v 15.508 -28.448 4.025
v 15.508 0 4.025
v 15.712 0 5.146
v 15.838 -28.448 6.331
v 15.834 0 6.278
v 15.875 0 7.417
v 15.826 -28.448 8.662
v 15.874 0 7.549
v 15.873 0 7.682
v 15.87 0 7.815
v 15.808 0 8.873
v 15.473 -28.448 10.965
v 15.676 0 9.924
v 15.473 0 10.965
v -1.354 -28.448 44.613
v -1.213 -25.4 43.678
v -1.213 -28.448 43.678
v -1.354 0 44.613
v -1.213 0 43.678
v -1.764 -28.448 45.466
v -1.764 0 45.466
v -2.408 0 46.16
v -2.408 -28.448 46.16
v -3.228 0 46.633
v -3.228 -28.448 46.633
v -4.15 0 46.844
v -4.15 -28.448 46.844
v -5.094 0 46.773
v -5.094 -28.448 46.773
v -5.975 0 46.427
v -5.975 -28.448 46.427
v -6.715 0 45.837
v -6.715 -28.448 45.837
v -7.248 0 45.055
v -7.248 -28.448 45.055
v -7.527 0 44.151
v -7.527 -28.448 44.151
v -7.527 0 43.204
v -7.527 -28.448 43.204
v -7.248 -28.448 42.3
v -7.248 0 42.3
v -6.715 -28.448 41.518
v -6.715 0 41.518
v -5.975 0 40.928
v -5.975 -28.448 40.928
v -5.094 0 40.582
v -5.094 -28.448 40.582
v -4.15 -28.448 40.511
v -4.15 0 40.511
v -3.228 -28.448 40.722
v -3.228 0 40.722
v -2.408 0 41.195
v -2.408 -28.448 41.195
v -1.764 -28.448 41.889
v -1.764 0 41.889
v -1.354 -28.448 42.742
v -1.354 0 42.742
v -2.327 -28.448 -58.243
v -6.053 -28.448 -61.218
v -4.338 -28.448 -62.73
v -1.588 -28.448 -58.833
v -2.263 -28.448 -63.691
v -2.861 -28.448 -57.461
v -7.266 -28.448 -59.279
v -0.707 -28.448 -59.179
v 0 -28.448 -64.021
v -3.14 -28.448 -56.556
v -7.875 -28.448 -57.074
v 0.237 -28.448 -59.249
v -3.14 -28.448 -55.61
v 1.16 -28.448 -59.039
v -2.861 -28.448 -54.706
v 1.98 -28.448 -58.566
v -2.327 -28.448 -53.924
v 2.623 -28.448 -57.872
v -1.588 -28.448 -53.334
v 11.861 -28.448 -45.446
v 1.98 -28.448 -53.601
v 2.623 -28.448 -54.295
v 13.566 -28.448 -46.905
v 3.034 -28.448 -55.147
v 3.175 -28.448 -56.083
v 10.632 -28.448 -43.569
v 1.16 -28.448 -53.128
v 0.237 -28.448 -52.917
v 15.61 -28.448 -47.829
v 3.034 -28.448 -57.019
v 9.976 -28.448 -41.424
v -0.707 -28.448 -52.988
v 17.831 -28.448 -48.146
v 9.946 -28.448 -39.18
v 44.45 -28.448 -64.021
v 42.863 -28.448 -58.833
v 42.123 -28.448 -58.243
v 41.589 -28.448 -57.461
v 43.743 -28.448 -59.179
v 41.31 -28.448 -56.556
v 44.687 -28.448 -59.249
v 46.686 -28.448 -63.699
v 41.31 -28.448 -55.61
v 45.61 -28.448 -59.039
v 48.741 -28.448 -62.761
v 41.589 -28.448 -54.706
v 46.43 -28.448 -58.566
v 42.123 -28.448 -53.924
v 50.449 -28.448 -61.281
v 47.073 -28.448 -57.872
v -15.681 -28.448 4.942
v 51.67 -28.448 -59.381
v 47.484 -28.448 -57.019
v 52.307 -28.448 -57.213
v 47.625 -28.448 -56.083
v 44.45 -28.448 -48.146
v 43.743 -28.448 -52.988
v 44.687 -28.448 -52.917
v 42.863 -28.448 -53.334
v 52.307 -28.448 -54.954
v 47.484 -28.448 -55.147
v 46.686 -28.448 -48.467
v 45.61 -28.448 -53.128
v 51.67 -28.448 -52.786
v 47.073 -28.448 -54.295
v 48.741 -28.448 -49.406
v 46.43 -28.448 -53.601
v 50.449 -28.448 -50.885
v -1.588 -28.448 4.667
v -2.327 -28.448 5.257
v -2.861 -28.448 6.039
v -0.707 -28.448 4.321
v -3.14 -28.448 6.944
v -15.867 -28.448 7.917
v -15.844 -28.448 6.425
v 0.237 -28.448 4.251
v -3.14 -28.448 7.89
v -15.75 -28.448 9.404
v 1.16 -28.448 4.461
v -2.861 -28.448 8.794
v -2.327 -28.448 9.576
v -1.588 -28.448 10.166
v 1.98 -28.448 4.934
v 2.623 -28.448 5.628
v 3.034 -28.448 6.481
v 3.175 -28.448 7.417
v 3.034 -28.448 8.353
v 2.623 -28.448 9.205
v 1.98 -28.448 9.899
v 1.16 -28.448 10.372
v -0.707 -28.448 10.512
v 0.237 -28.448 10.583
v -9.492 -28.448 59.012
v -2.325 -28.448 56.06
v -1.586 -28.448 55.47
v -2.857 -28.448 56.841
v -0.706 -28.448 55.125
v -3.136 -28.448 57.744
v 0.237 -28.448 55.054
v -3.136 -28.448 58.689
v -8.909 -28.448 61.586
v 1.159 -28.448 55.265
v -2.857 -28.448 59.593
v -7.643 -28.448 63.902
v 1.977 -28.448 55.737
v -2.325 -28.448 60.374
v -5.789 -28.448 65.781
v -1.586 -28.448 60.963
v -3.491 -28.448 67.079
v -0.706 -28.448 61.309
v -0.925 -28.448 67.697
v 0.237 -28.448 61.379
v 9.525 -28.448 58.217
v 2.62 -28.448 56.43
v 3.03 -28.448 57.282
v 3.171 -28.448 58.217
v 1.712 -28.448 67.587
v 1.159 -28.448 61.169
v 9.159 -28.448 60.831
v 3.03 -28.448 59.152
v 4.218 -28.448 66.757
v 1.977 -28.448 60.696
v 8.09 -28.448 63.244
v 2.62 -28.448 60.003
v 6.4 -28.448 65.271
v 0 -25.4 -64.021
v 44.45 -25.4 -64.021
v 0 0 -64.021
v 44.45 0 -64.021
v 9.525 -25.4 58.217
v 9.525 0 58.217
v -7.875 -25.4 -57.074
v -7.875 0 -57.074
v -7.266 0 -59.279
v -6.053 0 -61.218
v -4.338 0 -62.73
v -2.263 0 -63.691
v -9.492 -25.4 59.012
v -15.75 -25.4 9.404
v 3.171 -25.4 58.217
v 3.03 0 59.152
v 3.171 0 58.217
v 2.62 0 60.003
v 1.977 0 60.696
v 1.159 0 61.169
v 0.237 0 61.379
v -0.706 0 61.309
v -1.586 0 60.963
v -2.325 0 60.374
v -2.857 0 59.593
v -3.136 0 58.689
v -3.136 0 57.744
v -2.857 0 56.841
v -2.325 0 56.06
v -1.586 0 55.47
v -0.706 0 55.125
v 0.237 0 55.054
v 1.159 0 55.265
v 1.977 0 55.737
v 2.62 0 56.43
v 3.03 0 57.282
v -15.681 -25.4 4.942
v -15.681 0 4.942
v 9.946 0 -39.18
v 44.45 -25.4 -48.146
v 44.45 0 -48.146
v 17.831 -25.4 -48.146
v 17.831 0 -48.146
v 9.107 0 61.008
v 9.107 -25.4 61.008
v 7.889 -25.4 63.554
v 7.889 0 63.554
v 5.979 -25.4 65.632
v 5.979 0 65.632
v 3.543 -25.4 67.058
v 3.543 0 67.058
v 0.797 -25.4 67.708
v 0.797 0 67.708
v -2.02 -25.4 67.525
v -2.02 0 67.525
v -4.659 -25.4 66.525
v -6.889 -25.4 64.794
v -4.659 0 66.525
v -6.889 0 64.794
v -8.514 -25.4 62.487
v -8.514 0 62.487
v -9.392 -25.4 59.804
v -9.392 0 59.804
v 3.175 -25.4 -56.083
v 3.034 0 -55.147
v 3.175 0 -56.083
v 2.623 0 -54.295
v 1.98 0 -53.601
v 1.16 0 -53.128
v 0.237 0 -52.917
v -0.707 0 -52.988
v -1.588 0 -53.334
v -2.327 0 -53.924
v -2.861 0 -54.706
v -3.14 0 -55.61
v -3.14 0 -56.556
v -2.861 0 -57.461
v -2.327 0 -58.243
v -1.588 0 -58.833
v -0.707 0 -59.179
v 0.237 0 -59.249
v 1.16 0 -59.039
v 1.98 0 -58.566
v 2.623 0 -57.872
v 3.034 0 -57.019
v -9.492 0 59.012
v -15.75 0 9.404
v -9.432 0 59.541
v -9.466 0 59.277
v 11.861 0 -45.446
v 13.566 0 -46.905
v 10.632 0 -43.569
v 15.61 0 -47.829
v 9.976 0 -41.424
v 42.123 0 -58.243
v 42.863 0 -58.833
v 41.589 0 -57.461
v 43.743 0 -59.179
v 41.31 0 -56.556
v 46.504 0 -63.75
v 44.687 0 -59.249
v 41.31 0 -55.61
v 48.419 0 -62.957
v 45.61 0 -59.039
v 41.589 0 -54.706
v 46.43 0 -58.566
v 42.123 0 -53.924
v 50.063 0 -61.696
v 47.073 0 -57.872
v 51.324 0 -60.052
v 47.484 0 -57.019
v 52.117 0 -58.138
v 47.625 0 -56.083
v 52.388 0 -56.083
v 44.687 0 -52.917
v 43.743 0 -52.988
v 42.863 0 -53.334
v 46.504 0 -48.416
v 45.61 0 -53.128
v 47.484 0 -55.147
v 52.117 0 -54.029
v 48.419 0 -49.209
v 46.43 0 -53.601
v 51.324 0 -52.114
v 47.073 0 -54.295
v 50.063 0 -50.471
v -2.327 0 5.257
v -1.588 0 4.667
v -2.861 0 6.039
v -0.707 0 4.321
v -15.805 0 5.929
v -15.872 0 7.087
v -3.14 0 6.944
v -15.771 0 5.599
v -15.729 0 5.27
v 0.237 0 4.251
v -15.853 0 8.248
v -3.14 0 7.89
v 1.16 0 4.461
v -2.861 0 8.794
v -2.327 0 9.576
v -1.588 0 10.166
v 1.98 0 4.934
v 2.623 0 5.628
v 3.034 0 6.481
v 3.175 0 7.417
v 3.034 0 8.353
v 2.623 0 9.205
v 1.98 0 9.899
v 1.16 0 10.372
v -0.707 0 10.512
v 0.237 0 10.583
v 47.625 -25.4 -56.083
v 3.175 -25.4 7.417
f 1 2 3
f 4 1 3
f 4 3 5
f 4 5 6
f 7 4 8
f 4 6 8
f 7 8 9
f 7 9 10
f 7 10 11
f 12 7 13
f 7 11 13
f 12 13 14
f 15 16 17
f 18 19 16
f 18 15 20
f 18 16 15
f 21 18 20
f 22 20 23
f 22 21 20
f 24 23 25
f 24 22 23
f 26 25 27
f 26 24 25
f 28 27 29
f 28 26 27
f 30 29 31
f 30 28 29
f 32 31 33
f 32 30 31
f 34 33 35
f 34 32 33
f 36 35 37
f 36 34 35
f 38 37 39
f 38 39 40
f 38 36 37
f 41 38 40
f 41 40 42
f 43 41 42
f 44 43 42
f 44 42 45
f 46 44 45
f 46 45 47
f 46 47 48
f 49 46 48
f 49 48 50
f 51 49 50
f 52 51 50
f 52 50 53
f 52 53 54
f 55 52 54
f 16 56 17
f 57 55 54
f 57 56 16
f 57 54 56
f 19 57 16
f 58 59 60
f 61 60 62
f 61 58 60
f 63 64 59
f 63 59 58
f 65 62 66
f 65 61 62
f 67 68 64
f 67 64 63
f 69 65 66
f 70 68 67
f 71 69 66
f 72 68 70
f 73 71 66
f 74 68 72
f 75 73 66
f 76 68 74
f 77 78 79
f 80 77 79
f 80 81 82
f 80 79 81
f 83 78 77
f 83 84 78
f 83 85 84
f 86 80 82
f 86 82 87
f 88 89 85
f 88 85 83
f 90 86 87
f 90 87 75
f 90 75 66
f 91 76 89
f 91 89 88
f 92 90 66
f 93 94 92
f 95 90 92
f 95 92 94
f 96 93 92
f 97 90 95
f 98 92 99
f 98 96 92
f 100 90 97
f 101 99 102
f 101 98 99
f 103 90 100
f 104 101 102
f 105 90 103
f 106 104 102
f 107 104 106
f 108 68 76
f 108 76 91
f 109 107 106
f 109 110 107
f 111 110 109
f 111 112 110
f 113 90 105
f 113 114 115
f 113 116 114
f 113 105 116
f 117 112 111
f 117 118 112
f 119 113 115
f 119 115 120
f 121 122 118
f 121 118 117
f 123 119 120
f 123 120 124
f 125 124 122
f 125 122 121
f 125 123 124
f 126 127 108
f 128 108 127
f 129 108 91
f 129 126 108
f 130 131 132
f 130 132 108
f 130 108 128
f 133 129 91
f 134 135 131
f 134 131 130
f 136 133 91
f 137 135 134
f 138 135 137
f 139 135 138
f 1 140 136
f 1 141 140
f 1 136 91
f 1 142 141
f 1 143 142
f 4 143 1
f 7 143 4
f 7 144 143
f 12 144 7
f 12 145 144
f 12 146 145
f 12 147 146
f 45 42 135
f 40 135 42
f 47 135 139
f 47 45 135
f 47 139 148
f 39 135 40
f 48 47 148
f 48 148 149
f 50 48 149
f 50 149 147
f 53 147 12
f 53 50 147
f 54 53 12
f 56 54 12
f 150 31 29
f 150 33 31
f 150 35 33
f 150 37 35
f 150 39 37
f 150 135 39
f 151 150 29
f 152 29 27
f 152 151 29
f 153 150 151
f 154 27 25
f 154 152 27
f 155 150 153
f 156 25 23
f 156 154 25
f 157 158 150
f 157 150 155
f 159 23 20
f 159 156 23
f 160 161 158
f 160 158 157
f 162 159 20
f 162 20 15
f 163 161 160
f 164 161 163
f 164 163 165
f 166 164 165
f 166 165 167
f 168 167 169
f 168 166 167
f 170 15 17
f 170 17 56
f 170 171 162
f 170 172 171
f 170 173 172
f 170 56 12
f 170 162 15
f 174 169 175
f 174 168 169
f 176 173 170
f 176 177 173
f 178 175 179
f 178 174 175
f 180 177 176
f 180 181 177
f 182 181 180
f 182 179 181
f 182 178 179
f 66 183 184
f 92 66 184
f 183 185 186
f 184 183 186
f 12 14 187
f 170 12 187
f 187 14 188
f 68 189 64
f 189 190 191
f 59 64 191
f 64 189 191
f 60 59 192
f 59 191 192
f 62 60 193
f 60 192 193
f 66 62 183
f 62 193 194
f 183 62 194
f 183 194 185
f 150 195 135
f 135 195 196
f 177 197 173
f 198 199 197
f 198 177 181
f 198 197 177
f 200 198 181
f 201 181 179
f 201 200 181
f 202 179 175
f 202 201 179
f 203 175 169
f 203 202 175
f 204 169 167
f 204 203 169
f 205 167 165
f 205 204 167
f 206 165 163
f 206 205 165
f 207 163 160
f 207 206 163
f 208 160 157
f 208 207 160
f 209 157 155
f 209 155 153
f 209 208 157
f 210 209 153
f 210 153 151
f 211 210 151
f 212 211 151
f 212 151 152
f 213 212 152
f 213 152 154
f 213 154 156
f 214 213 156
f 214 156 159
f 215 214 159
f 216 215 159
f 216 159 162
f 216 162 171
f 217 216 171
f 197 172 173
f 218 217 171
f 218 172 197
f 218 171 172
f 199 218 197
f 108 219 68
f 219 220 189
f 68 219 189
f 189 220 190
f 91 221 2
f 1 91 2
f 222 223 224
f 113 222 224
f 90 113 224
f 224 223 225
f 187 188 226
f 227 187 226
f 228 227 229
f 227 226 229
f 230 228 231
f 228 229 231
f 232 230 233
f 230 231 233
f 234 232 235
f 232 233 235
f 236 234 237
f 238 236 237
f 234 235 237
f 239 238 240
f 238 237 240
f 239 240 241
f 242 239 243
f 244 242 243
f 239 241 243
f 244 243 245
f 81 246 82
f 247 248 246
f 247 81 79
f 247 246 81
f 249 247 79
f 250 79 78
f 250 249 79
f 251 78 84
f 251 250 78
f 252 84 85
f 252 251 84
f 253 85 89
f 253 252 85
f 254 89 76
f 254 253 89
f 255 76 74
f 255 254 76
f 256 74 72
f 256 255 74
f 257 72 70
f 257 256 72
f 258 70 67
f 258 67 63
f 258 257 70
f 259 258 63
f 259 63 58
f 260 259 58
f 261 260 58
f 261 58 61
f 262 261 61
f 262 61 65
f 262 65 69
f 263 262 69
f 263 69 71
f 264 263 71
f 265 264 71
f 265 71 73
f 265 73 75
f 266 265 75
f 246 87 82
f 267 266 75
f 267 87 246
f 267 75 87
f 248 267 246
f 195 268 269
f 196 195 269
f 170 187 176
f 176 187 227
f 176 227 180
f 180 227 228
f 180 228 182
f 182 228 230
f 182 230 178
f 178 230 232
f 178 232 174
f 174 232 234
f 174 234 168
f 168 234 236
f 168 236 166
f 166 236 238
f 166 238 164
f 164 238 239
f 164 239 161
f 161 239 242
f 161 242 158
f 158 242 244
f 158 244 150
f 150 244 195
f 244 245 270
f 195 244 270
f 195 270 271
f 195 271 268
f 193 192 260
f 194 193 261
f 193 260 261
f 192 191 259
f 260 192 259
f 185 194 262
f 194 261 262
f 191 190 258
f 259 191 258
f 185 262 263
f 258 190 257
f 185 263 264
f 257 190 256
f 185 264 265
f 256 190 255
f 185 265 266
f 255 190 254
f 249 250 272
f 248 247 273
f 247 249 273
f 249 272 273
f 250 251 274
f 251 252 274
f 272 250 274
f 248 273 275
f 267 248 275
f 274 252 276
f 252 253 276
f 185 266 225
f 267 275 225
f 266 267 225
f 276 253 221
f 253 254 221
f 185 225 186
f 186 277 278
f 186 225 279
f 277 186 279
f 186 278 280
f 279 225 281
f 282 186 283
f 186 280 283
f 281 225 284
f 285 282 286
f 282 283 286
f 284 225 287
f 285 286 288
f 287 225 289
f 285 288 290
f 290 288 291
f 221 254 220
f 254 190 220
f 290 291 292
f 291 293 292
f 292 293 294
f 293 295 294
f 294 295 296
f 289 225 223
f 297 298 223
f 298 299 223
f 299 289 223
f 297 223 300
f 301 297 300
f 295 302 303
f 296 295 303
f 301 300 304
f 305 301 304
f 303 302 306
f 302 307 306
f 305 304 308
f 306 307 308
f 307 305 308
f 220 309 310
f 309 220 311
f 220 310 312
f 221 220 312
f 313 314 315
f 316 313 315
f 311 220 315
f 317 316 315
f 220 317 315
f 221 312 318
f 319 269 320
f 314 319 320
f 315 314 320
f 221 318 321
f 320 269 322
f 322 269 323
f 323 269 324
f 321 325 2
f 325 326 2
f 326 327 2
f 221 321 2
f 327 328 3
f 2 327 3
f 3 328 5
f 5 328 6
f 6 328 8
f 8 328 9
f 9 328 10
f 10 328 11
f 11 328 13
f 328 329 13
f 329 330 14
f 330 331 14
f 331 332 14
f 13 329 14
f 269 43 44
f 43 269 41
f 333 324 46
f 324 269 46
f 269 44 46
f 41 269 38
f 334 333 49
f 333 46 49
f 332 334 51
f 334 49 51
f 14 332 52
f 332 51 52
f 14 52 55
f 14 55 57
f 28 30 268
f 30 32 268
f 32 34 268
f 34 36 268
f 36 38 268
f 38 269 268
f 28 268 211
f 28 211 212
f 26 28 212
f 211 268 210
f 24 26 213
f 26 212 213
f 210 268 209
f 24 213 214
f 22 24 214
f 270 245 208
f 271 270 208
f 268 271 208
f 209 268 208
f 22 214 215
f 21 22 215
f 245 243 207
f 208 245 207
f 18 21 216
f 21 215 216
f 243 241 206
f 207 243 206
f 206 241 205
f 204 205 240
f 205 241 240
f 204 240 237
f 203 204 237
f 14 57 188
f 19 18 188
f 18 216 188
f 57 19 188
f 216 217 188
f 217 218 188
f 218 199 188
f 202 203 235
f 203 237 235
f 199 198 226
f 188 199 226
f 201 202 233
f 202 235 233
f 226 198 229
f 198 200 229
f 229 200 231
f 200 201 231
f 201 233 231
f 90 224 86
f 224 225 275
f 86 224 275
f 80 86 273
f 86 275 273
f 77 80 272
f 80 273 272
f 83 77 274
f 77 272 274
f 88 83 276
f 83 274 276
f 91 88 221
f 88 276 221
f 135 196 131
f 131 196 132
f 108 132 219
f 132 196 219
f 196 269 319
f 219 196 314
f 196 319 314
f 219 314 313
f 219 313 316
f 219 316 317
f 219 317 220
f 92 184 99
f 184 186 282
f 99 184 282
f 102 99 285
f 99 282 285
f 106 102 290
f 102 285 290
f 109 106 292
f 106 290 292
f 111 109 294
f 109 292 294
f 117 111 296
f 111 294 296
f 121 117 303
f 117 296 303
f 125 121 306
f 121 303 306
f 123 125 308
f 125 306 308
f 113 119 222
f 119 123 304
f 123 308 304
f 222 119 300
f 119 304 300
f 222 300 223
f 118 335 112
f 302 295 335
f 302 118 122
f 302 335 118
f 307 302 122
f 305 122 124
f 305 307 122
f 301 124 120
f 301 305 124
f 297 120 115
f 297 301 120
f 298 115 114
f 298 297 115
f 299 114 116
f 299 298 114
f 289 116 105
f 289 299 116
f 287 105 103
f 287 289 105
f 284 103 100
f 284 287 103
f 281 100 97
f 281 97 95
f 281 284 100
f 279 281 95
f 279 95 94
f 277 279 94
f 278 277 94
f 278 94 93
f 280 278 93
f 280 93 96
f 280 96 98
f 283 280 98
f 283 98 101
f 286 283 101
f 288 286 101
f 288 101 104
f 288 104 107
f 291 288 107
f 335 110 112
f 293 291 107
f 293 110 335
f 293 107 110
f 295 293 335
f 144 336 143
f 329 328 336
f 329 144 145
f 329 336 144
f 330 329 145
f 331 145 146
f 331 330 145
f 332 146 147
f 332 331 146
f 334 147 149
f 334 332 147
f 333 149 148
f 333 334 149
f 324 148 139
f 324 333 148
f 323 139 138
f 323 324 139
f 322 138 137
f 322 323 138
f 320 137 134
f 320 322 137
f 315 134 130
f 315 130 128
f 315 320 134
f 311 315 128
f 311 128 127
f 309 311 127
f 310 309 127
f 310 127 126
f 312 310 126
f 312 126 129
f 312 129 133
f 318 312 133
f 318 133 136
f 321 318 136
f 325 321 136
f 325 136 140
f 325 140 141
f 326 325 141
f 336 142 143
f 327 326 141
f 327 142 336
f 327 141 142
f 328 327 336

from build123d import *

# Parameters (mm, degrees)
F0_R        = 3.1712374005
F0_R_2      = 3.175
F1_DEPTH    = 3.048
F2_DEPTH    = 3.048
F3_DEPTH    = 3.048
F1_FACE_R   = 3.1712374005
F1_FACE_R_2 = 3.175
F4_DEPTH    = 25.4


with BuildPart() as f1:
    # F0 (on Front) → F1 (new body)
    with BuildSketch(Plane.XZ):
        with BuildLine():
            ThreePointArc((-9.4917820271, 59.0115925485), (-0.3977443851, 48.7001057545), (9.525, 58.2167976379))
            ThreePointArc((9.525, 58.2167976379), (0.7965401292, 67.7084333675), (-9.3917766557, 59.8042976379))
            Line((-9.3917766557, 59.8042976379), (-9.4917820271, 59.0115925485))
        make_face()
        with Locations((0, 58.2167976379)):
            Circle(F0_R, mode=Mode.SUBTRACT)
        with BuildLine():
            Line((15.4734514542, 10.9647442403), (9.525, 58.2167976379))
            ThreePointArc((9.525, 58.2167976379), (-0.3977443851, 48.7001057545), (-9.4917820271, 59.0115925485))
            Line((-9.4917820271, 59.0115925485), (-15.7501580655, 9.4037918285))
            ThreePointArc((-15.7501580655, 9.4037918285), (-0.7926441479, 23.2719967933), (15.4734514542, 10.9647442403))
        make_face()
        with Locations((-4.3875967011, 43.6775095756)):
            Circle(F0_R_2, mode=Mode.SUBTRACT)
        with BuildLine():
            Line((-9.4917820271, 59.0115925485), (-9.3917766557, 59.8042976379))
            ThreePointArc((-9.3917766557, 59.8042976379), (-9.4500948393, 59.4089941523), (-9.4917820271, 59.0115925485))
        make_face()
        with BuildLine():
            Line((15.8700148845, 7.8146073471), (15.4734514542, 10.9647442403))
            ThreePointArc((15.4734514542, 10.9647442403), (-0.7926441479, 23.2719967933), (-15.7501580655, 9.4037918285))
            ThreePointArc((-15.7501580655, 9.4037918285), (-15.8730177398, 7.6676618089), (-15.8050828508, 5.9285163879))
            Line((-15.8050828508, 5.9285163879), (-15.6809380298, 4.942164836))
            ThreePointArc((-15.6809380298, 4.942164836), (-0.466737478, -8.4513396543), (15.5083792346, 4.0247778098))
            ThreePointArc((15.5083792346, 4.0247778098), (15.7830786818, 5.7109100903), (15.875, 7.4167976379))
            ThreePointArc((15.875, 7.4167976379), (15.8737536722, 7.6157181095), (15.8700148845, 7.8146073471))
        make_face()
        with Locations((0, 7.4167976379)):
            Circle(F0_R_2, mode=Mode.SUBTRACT)
        with BuildLine():
            ThreePointArc((15.8700148845, 7.8146073471), (15.7506844659, 9.3996147894), (15.4734514542, 10.9647442403))
            Line((15.4734514542, 10.9647442403), (15.8700148845, 7.8146073471))
        make_face()
        with BuildLine():
            Line((-15.6809380298, 4.942164836), (-15.8050828508, 5.9285163879))
            ThreePointArc((-15.8050828508, 5.9285163879), (-15.7507333185, 5.43436859), (-15.6809380298, 4.942164836))
        make_face()
        with BuildLine():
            ThreePointArc((15.5083792346, 4.0247778098), (-0.466737478, -8.4513396543), (-15.6809380298, 4.942164836))
            Line((-15.6809380298, 4.942164836), (-7.8753666592, -57.074416886))
            ThreePointArc((-7.8753666592, -57.074416886), (-0.4965799997, -48.1612509261), (7.9375, -56.0832023621))
            ThreePointArc((7.9375, -56.0832023621), (5.6126600757, -61.6958624377), (0, -64.0207023621))
            Line((0, -64.0207023621), (44.45, -64.0207023621))
            ThreePointArc((44.45, -64.0207023621), (36.5125, -56.0832023621), (44.45, -48.1457023621))
            Line((44.45, -48.1457023621), (17.8308056521, -48.1457023621))
            ThreePointArc((17.8308056521, -48.1457023621), (11.8610133248, -45.4459556386), (9.9456918977, -39.1802875471))
            Line((9.9456918977, -39.1802875471), (15.5083792346, 4.0247778098))
        make_face()
        with BuildLine():
            ThreePointArc((7.9375, -56.0832023621), (-0.4965799997, -48.1612509261), (-7.8753666592, -57.074416886))
            ThreePointArc((-7.8753666592, -57.074416886), (-5.2505304954, -62.0360030279), (0, -64.0207023621))
            ThreePointArc((0, -64.0207023621), (5.6126600757, -61.6958624377), (7.9375, -56.0832023621))
        make_face()
        with Locations((0, -56.0832023621)):
            Circle(F0_R_2, mode=Mode.SUBTRACT)
        with BuildLine():
            ThreePointArc((44.45, -48.1457023621), (36.5125, -56.0832023621), (44.45, -64.0207023621))
            ThreePointArc((44.45, -64.0207023621), (50.0626600757, -61.6958624377), (52.3875, -56.0832023621))
            ThreePointArc((52.3875, -56.0832023621), (50.0626600757, -50.4705422864), (44.45, -48.1457023621))
        make_face()
        with Locations((44.45, -56.0832023621)):
            Circle(F0_R_2, mode=Mode.SUBTRACT)
    extrude(amount=F1_DEPTH)

    # F0 (on Front) → F2 (join)
    with BuildSketch(Plane.XZ):
        with BuildLine():
            ThreePointArc((-9.4917820271, 59.0115925485), (-0.3977443851, 48.7001057545), (9.525, 58.2167976379))
            ThreePointArc((9.525, 58.2167976379), (0.7965401292, 67.7084333675), (-9.3917766557, 59.8042976379))
            Line((-9.3917766557, 59.8042976379), (-9.4917820271, 59.0115925485))
        make_face()
        with Locations((0, 58.2167976379)):
            Circle(F0_R, mode=Mode.SUBTRACT)
        with BuildLine():
            Line((15.4734514542, 10.9647442403), (9.525, 58.2167976379))
            ThreePointArc((9.525, 58.2167976379), (-0.3977443851, 48.7001057545), (-9.4917820271, 59.0115925485))
            Line((-9.4917820271, 59.0115925485), (-15.7501580655, 9.4037918285))
            ThreePointArc((-15.7501580655, 9.4037918285), (-0.7926441479, 23.2719967933), (15.4734514542, 10.9647442403))
        make_face()
        with Locations((-4.3875967011, 43.6775095756)):
            Circle(F0_R_2, mode=Mode.SUBTRACT)
        with BuildLine():
            Line((-9.4917820271, 59.0115925485), (-9.3917766557, 59.8042976379))
            ThreePointArc((-9.3917766557, 59.8042976379), (-9.4500948393, 59.4089941523), (-9.4917820271, 59.0115925485))
        make_face()
        with BuildLine():
            Line((15.8700148845, 7.8146073471), (15.4734514542, 10.9647442403))
            ThreePointArc((15.4734514542, 10.9647442403), (-0.7926441479, 23.2719967933), (-15.7501580655, 9.4037918285))
            ThreePointArc((-15.7501580655, 9.4037918285), (-15.8730177398, 7.6676618089), (-15.8050828508, 5.9285163879))
            Line((-15.8050828508, 5.9285163879), (-15.6809380298, 4.942164836))
            ThreePointArc((-15.6809380298, 4.942164836), (-0.466737478, -8.4513396543), (15.5083792346, 4.0247778098))
            ThreePointArc((15.5083792346, 4.0247778098), (15.7830786818, 5.7109100903), (15.875, 7.4167976379))
            ThreePointArc((15.875, 7.4167976379), (15.8737536722, 7.6157181095), (15.8700148845, 7.8146073471))
        make_face()
        with Locations((0, 7.4167976379)):
            Circle(F0_R_2, mode=Mode.SUBTRACT)
        with BuildLine():
            ThreePointArc((15.8700148845, 7.8146073471), (15.7506844659, 9.3996147894), (15.4734514542, 10.9647442403))
            Line((15.4734514542, 10.9647442403), (15.8700148845, 7.8146073471))
        make_face()
        with BuildLine():
            Line((-15.6809380298, 4.942164836), (-15.8050828508, 5.9285163879))
            ThreePointArc((-15.8050828508, 5.9285163879), (-15.7507333185, 5.43436859), (-15.6809380298, 4.942164836))
        make_face()
        with BuildLine():
            ThreePointArc((15.5083792346, 4.0247778098), (-0.466737478, -8.4513396543), (-15.6809380298, 4.942164836))
            Line((-15.6809380298, 4.942164836), (-7.8753666592, -57.074416886))
            ThreePointArc((-7.8753666592, -57.074416886), (-0.4965799997, -48.1612509261), (7.9375, -56.0832023621))
            ThreePointArc((7.9375, -56.0832023621), (5.6126600757, -61.6958624377), (0, -64.0207023621))
            Line((0, -64.0207023621), (44.45, -64.0207023621))
            ThreePointArc((44.45, -64.0207023621), (36.5125, -56.0832023621), (44.45, -48.1457023621))
            Line((44.45, -48.1457023621), (17.8308056521, -48.1457023621))
            ThreePointArc((17.8308056521, -48.1457023621), (11.8610133248, -45.4459556386), (9.9456918977, -39.1802875471))
            Line((9.9456918977, -39.1802875471), (15.5083792346, 4.0247778098))
        make_face()
        with BuildLine():
            ThreePointArc((7.9375, -56.0832023621), (-0.4965799997, -48.1612509261), (-7.8753666592, -57.074416886))
            ThreePointArc((-7.8753666592, -57.074416886), (-5.2505304954, -62.0360030279), (0, -64.0207023621))
            ThreePointArc((0, -64.0207023621), (5.6126600757, -61.6958624377), (7.9375, -56.0832023621))
        make_face()
        with Locations((0, -56.0832023621)):
            Circle(F0_R_2, mode=Mode.SUBTRACT)
        with BuildLine():
            ThreePointArc((44.45, -48.1457023621), (36.5125, -56.0832023621), (44.45, -64.0207023621))
            ThreePointArc((44.45, -64.0207023621), (50.0626600757, -61.6958624377), (52.3875, -56.0832023621))
            ThreePointArc((52.3875, -56.0832023621), (50.0626600757, -50.4705422864), (44.45, -48.1457023621))
        make_face()
        with Locations((44.45, -56.0832023621)):
            Circle(F0_R_2, mode=Mode.SUBTRACT)
    extrude(amount=F2_DEPTH)

    # F0 (on Front) → F3 (join)
    with BuildSketch(Plane.XZ):
        with BuildLine():
            ThreePointArc((-9.4917820271, 59.0115925485), (-0.3977443851, 48.7001057545), (9.525, 58.2167976379))
            ThreePointArc((9.525, 58.2167976379), (0.7965401292, 67.7084333675), (-9.3917766557, 59.8042976379))
            Line((-9.3917766557, 59.8042976379), (-9.4917820271, 59.0115925485))
        make_face()
        with Locations((0, 58.2167976379)):
            Circle(F0_R, mode=Mode.SUBTRACT)
        with BuildLine():
            Line((15.4734514542, 10.9647442403), (9.525, 58.2167976379))
            ThreePointArc((9.525, 58.2167976379), (-0.3977443851, 48.7001057545), (-9.4917820271, 59.0115925485))
            Line((-9.4917820271, 59.0115925485), (-15.7501580655, 9.4037918285))
            ThreePointArc((-15.7501580655, 9.4037918285), (-0.7926441479, 23.2719967933), (15.4734514542, 10.9647442403))
        make_face()
        with Locations((-4.3875967011, 43.6775095756)):
            Circle(F0_R_2, mode=Mode.SUBTRACT)
        with BuildLine():
            Line((-9.4917820271, 59.0115925485), (-9.3917766557, 59.8042976379))
            ThreePointArc((-9.3917766557, 59.8042976379), (-9.4500948393, 59.4089941523), (-9.4917820271, 59.0115925485))
        make_face()
        with BuildLine():
            Line((15.8700148845, 7.8146073471), (15.4734514542, 10.9647442403))
            ThreePointArc((15.4734514542, 10.9647442403), (-0.7926441479, 23.2719967933), (-15.7501580655, 9.4037918285))
            ThreePointArc((-15.7501580655, 9.4037918285), (-15.8730177398, 7.6676618089), (-15.8050828508, 5.9285163879))
            Line((-15.8050828508, 5.9285163879), (-15.6809380298, 4.942164836))
            ThreePointArc((-15.6809380298, 4.942164836), (-0.466737478, -8.4513396543), (15.5083792346, 4.0247778098))
            ThreePointArc((15.5083792346, 4.0247778098), (15.7830786818, 5.7109100903), (15.875, 7.4167976379))
            ThreePointArc((15.875, 7.4167976379), (15.8737536722, 7.6157181095), (15.8700148845, 7.8146073471))
        make_face()
        with Locations((0, 7.4167976379)):
            Circle(F0_R_2, mode=Mode.SUBTRACT)
        with BuildLine():
            ThreePointArc((15.8700148845, 7.8146073471), (15.7506844659, 9.3996147894), (15.4734514542, 10.9647442403))
            Line((15.4734514542, 10.9647442403), (15.8700148845, 7.8146073471))
        make_face()
        with BuildLine():
            Line((-15.6809380298, 4.942164836), (-15.8050828508, 5.9285163879))
            ThreePointArc((-15.8050828508, 5.9285163879), (-15.7507333185, 5.43436859), (-15.6809380298, 4.942164836))
        make_face()
        with BuildLine():
            ThreePointArc((15.5083792346, 4.0247778098), (-0.466737478, -8.4513396543), (-15.6809380298, 4.942164836))
            Line((-15.6809380298, 4.942164836), (-7.8753666592, -57.074416886))
            ThreePointArc((-7.8753666592, -57.074416886), (-0.4965799997, -48.1612509261), (7.9375, -56.0832023621))
            ThreePointArc((7.9375, -56.0832023621), (5.6126600757, -61.6958624377), (0, -64.0207023621))
            Line((0, -64.0207023621), (44.45, -64.0207023621))
            ThreePointArc((44.45, -64.0207023621), (36.5125, -56.0832023621), (44.45, -48.1457023621))
            Line((44.45, -48.1457023621), (17.8308056521, -48.1457023621))
            ThreePointArc((17.8308056521, -48.1457023621), (11.8610133248, -45.4459556386), (9.9456918977, -39.1802875471))
            Line((9.9456918977, -39.1802875471), (15.5083792346, 4.0247778098))
        make_face()
        with BuildLine():
            ThreePointArc((7.9375, -56.0832023621), (-0.4965799997, -48.1612509261), (-7.8753666592, -57.074416886))
            ThreePointArc((-7.8753666592, -57.074416886), (-5.2505304954, -62.0360030279), (0, -64.0207023621))
            ThreePointArc((0, -64.0207023621), (5.6126600757, -61.6958624377), (7.9375, -56.0832023621))
        make_face()
        with Locations((0, -56.0832023621)):
            Circle(F0_R_2, mode=Mode.SUBTRACT)
        with BuildLine():
            ThreePointArc((44.45, -48.1457023621), (36.5125, -56.0832023621), (44.45, -64.0207023621))
            ThreePointArc((44.45, -64.0207023621), (50.0626600757, -61.6958624377), (52.3875, -56.0832023621))
            ThreePointArc((52.3875, -56.0832023621), (50.0626600757, -50.4705422864), (44.45, -48.1457023621))
        make_face()
        with Locations((44.45, -56.0832023621)):
            Circle(F0_R_2, mode=Mode.SUBTRACT)
    extrude(amount=F3_DEPTH)

    # F0 (on Front) + F1_face (on face) → F4 (join)
    with BuildSketch(Plane.XZ):
        with BuildLine():
            ThreePointArc((-9.4917820271, 59.0115925485), (-0.3977443851, 48.7001057545), (9.525, 58.2167976379))
            ThreePointArc((9.525, 58.2167976379), (0.7965401292, 67.7084333675), (-9.3917766557, 59.8042976379))
            Line((-9.3917766557, 59.8042976379), (-9.4917820271, 59.0115925485))
        make_face()
        with Locations((0, 58.2167976379)):
            Circle(F0_R, mode=Mode.SUBTRACT)
        with BuildLine():
            Line((15.4734514542, 10.9647442403), (9.525, 58.2167976379))
            ThreePointArc((9.525, 58.2167976379), (-0.3977443851, 48.7001057545), (-9.4917820271, 59.0115925485))
            Line((-9.4917820271, 59.0115925485), (-15.7501580655, 9.4037918285))
            ThreePointArc((-15.7501580655, 9.4037918285), (-0.7926441479, 23.2719967933), (15.4734514542, 10.9647442403))
        make_face()
        with Locations((-4.3875967011, 43.6775095756)):
            Circle(F0_R_2, mode=Mode.SUBTRACT)
        with BuildLine():
            Line((-9.4917820271, 59.0115925485), (-9.3917766557, 59.8042976379))
            ThreePointArc((-9.3917766557, 59.8042976379), (-9.4500948393, 59.4089941523), (-9.4917820271, 59.0115925485))
        make_face()
        with BuildLine():
            Line((15.8700148845, 7.8146073471), (15.4734514542, 10.9647442403))
            ThreePointArc((15.4734514542, 10.9647442403), (-0.7926441479, 23.2719967933), (-15.7501580655, 9.4037918285))
            ThreePointArc((-15.7501580655, 9.4037918285), (-15.8730177398, 7.6676618089), (-15.8050828508, 5.9285163879))
            Line((-15.8050828508, 5.9285163879), (-15.6809380298, 4.942164836))
            ThreePointArc((-15.6809380298, 4.942164836), (-0.466737478, -8.4513396543), (15.5083792346, 4.0247778098))
            ThreePointArc((15.5083792346, 4.0247778098), (15.7830786818, 5.7109100903), (15.875, 7.4167976379))
            ThreePointArc((15.875, 7.4167976379), (15.8737536722, 7.6157181095), (15.8700148845, 7.8146073471))
        make_face()
        with Locations((0, 7.4167976379)):
            Circle(F0_R_2, mode=Mode.SUBTRACT)
        with BuildLine():
            ThreePointArc((15.8700148845, 7.8146073471), (15.7506844659, 9.3996147894), (15.4734514542, 10.9647442403))
            Line((15.4734514542, 10.9647442403), (15.8700148845, 7.8146073471))
        make_face()
        with BuildLine():
            Line((-15.6809380298, 4.942164836), (-15.8050828508, 5.9285163879))
            ThreePointArc((-15.8050828508, 5.9285163879), (-15.7507333185, 5.43436859), (-15.6809380298, 4.942164836))
        make_face()
        with BuildLine():
            ThreePointArc((15.5083792346, 4.0247778098), (-0.466737478, -8.4513396543), (-15.6809380298, 4.942164836))
            Line((-15.6809380298, 4.942164836), (-7.8753666592, -57.074416886))
            ThreePointArc((-7.8753666592, -57.074416886), (-0.4965799997, -48.1612509261), (7.9375, -56.0832023621))
            ThreePointArc((7.9375, -56.0832023621), (5.6126600757, -61.6958624377), (0, -64.0207023621))
            Line((0, -64.0207023621), (44.45, -64.0207023621))
            ThreePointArc((44.45, -64.0207023621), (36.5125, -56.0832023621), (44.45, -48.1457023621))
            Line((44.45, -48.1457023621), (17.8308056521, -48.1457023621))
            ThreePointArc((17.8308056521, -48.1457023621), (11.8610133248, -45.4459556386), (9.9456918977, -39.1802875471))
            Line((9.9456918977, -39.1802875471), (15.5083792346, 4.0247778098))
        make_face()
        with BuildLine():
            ThreePointArc((7.9375, -56.0832023621), (-0.4965799997, -48.1612509261), (-7.8753666592, -57.074416886))
            ThreePointArc((-7.8753666592, -57.074416886), (-5.2505304954, -62.0360030279), (0, -64.0207023621))
            ThreePointArc((0, -64.0207023621), (5.6126600757, -61.6958624377), (7.9375, -56.0832023621))
        make_face()
        with Locations((0, -56.0832023621)):
            Circle(F0_R_2, mode=Mode.SUBTRACT)
        with BuildLine():
            ThreePointArc((44.45, -48.1457023621), (36.5125, -56.0832023621), (44.45, -64.0207023621))
            ThreePointArc((44.45, -64.0207023621), (50.0626600757, -61.6958624377), (52.3875, -56.0832023621))
            ThreePointArc((52.3875, -56.0832023621), (50.0626600757, -50.4705422864), (44.45, -48.1457023621))
        make_face()
        with Locations((44.45, -56.0832023621)):
            Circle(F0_R_2, mode=Mode.SUBTRACT)
    with BuildSketch(Plane(origin=(5.2109211205, -3.048, -7.8157701238), x_dir=(1, 0, 0), z_dir=(0, -1, 0))):
        with BuildLine():
            ThreePointArc((4.3140788795, 66.0325677618), (-4.8131767354, 75.5492596452), (-14.7027031477, 66.8273626723))
            Line((-14.7027031477, 66.8273626723), (-20.961079186, 17.2195619523))
            ThreePointArc((-20.961079186, 17.2195619523), (-21.0840109046, 14.9863042704), (-20.8918591504, 12.7579349598))
            Line((-20.8918591504, 12.7579349598), (-13.0862877798, -49.2586467622))
            ThreePointArc((-13.0862877798, -49.2586467622), (-10.4614516159, -54.220232904), (-5.2109211205, -56.2049322382))
            Line((-5.2109211205, -56.2049322382), (39.2390788795, -56.2049322382))
            ThreePointArc((39.2390788795, -56.2049322382), (47.1765788795, -48.2674322382), (39.2390788795, -40.3299322382))
            Line((39.2390788795, -40.3299322382), (12.6198845315, -40.3299322382))
            ThreePointArc((12.6198845315, -40.3299322382), (6.6500922043, -37.6301855148), (4.7347707772, -31.3645174233))
            Line((4.7347707772, -31.3645174233), (10.2974581141, 11.8405479336))
            ThreePointArc((10.2974581141, 11.8405479336), (10.6638778301, 15.3124631758), (10.2625303337, 18.7805143641))
            Line((10.2625303337, 18.7805143641), (4.3140788795, 66.0325677618))
        make_face()
        with Locations((-5.2109211205, 66.0325677618)):
            Circle(F1_FACE_R, mode=Mode.SUBTRACT)
        with Locations((-9.5985178216, 51.4932796995)):
            Circle(F1_FACE_R_2, mode=Mode.SUBTRACT)
        with Locations((-5.2109211205, 15.2325677618)):
            Circle(F1_FACE_R_2, mode=Mode.SUBTRACT)
        with Locations((-5.2109211205, -48.2674322382)):
            Circle(F1_FACE_R_2, mode=Mode.SUBTRACT)
        with Locations((39.2390788795, -48.2674322382)):
            Circle(F1_FACE_R_2, mode=Mode.SUBTRACT)
    extrude(amount=F4_DEPTH)


solid = f1.part
